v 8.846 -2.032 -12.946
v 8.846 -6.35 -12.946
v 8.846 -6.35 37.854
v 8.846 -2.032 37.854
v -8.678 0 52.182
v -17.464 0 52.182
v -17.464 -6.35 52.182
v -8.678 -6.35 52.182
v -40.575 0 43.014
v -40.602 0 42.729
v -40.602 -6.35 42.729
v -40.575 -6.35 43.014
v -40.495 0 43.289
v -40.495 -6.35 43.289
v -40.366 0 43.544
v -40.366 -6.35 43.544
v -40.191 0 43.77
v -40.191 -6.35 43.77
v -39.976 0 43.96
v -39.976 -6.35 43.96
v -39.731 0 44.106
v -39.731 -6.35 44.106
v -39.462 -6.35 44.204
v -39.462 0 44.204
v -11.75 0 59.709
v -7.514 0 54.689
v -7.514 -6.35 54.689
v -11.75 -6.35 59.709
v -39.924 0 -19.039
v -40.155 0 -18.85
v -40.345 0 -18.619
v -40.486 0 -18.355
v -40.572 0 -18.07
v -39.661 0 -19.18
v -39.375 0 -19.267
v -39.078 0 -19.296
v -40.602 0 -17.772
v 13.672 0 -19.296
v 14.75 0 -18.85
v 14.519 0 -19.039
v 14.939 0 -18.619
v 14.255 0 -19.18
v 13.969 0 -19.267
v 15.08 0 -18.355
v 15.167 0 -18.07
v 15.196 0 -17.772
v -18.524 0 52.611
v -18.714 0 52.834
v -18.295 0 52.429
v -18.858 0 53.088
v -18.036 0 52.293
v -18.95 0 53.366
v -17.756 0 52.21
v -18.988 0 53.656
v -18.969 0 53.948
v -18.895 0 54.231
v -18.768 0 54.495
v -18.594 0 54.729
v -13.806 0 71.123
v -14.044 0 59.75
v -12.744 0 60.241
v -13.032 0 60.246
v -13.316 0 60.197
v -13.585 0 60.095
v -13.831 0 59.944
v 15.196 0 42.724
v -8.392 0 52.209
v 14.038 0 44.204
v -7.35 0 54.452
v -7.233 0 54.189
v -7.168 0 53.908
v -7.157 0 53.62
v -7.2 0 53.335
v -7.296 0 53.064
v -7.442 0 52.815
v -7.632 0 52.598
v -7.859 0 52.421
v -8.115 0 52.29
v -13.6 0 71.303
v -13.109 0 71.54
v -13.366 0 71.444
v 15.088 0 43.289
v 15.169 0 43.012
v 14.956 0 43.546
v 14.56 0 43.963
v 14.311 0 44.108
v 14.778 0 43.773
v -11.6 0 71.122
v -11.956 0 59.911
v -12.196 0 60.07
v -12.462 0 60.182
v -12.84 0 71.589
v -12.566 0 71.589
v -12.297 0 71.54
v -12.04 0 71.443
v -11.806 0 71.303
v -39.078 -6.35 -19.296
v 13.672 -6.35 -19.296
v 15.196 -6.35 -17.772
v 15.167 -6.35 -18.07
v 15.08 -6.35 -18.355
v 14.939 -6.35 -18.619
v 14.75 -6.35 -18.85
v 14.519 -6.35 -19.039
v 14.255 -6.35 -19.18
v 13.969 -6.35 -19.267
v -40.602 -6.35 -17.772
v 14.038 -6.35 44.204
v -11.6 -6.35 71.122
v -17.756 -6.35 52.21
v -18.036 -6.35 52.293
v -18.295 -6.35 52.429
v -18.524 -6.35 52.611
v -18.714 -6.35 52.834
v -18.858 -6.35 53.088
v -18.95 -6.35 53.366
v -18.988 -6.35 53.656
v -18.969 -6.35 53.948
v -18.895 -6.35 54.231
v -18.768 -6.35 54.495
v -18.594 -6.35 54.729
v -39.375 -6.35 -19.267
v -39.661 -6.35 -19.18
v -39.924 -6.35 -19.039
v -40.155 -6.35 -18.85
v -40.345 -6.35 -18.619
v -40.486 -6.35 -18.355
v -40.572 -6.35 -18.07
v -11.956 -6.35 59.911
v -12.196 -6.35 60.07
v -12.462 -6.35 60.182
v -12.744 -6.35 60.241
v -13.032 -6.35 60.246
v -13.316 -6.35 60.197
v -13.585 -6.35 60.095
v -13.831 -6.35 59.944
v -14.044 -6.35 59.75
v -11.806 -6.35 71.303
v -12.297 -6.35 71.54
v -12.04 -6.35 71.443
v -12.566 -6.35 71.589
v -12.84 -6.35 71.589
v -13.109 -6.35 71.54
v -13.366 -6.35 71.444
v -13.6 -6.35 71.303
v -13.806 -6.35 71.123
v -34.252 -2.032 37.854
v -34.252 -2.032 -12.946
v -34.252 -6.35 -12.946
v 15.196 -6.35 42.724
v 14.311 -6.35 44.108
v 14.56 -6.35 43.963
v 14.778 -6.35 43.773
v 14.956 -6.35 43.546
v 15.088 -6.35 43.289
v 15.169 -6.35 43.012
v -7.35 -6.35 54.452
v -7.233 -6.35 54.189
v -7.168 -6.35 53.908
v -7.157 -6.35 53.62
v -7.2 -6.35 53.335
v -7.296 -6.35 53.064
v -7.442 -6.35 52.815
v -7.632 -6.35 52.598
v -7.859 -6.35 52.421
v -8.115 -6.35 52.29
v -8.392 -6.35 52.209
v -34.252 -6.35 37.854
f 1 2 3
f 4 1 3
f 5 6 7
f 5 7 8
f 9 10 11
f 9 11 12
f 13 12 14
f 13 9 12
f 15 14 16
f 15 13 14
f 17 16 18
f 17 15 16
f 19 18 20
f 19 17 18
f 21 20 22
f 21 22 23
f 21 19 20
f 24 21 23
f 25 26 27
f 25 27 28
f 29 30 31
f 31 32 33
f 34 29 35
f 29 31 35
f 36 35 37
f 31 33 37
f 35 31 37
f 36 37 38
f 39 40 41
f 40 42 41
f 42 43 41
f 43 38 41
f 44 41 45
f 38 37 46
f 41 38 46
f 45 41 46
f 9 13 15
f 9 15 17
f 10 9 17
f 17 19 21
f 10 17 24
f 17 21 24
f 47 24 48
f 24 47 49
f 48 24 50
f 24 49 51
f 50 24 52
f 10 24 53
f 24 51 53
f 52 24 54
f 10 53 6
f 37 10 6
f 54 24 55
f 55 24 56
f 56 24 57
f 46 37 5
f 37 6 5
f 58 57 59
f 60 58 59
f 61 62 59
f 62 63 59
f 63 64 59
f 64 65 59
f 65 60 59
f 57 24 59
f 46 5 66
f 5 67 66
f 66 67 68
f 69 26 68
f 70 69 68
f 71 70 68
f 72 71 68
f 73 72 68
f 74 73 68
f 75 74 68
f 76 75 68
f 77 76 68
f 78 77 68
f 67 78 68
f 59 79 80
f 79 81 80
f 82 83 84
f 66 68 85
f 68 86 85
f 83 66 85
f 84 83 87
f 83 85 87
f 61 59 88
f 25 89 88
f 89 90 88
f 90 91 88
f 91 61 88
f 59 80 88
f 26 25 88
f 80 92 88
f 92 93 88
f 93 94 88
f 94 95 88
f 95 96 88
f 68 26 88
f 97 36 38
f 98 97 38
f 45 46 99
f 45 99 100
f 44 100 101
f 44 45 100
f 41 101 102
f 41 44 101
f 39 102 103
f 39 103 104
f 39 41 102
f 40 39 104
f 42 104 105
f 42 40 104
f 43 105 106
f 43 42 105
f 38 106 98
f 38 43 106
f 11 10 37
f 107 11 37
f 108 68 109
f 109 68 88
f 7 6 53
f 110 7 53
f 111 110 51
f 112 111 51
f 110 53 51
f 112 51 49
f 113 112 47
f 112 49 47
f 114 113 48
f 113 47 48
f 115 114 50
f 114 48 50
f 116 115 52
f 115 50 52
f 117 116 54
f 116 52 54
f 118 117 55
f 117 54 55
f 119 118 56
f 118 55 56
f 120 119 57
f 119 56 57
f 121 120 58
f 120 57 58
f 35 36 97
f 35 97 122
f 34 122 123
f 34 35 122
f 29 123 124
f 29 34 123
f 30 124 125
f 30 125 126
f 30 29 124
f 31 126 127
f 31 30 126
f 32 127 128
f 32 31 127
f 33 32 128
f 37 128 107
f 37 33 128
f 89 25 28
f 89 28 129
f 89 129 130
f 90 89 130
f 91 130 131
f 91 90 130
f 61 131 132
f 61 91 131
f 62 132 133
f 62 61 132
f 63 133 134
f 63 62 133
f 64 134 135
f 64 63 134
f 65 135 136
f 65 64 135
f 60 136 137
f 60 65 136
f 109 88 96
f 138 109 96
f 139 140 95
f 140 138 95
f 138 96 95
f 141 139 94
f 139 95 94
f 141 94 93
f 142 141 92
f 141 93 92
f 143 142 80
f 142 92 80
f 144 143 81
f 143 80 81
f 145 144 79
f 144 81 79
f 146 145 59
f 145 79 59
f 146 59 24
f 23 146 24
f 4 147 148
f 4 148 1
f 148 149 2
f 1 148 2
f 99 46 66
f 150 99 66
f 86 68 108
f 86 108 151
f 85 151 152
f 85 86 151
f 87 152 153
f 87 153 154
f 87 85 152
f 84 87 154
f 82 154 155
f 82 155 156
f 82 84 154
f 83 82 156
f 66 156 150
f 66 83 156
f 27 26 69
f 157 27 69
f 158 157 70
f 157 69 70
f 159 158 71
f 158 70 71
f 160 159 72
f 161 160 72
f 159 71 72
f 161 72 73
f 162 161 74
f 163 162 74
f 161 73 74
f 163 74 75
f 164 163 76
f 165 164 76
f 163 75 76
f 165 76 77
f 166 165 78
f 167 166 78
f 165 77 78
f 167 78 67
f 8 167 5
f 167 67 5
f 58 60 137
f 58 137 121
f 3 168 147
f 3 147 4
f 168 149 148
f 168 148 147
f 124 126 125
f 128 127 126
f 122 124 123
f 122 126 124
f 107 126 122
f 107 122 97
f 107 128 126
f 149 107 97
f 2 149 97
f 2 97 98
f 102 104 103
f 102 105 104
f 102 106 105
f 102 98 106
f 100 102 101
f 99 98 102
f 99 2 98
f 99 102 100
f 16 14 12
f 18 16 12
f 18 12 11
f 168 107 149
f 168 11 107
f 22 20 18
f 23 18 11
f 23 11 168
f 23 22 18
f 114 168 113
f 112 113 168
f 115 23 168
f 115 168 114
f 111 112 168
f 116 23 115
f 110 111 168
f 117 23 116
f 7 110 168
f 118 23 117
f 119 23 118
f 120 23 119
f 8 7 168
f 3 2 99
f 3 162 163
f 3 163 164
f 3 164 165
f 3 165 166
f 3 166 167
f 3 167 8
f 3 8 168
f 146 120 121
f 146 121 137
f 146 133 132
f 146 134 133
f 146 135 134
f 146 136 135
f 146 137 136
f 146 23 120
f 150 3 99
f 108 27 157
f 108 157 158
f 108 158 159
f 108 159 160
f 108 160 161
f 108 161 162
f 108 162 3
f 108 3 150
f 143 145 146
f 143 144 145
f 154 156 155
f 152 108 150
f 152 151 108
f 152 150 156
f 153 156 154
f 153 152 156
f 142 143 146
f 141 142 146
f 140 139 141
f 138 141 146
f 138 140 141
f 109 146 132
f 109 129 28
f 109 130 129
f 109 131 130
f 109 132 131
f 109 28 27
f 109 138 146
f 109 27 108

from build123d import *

# Parameters (mm, degrees)
F1_DEPTH     = 6.35
F2_W         = 43.0978981023
F2_H         = 50.8
F3_DEPTH     = 4.318
F5_DEPTH     = 6.35
F7_DEPTH     = 6.351
F8_T1_DEPTH  = 6.35
F8_T3_DEPTH  = 6.35
F8_T5_DEPTH  = 6.35
F8_T7_DEPTH  = 13.7467402192
F8_T9_DEPTH  = 14.3479140779
F8_T11_DEPTH = 13.97
F8_T13_DEPTH = 13.97
F8_T15_DEPTH = 13.724225926


# Not quite as in the source:
# - a fillet or chamfer that OpenCascade refuses, or shapes differently, is made with other operations: its cross-section is extruded or revolved along the edge and cut away or added


with BuildPart() as f1:
    # F0 (on Front) → F1 (new body)
    with BuildSketch(Plane.XZ):
        Polygon((-40.601760045, 44.2037712147), (-40.601760045, 20.0136204353), (-40.601760045, -19.2962287853), (-31.9894673416, -19.2962287853), (6.5923849878, -19.2962287853), (15.1961380572, -19.2962287853), (15.1961380572, 20.0136204353), (15.1961380572, 44.2037712147), align=None)
    extrude(amount=F1_DEPTH)

    # F2 (on face) → F3 (cut, through all)
    with BuildSketch(Plane.XZ.offset(6.35)):
        with Locations((-12.7028109939, 12.4537712147)):
            Rectangle(F2_W, F2_H)
    extrude(amount=-F3_DEPTH, mode=Mode.SUBTRACT)

    # F4 (on Front) → F5 (join, through all)
    with BuildSketch(Plane.XZ):
        Polygon((-12.7028109939, 72.2804571797), (-39.4616971228, 44.2037712147), (14.0383420512, 44.2037712147), align=None)
    extrude(amount=F5_DEPTH)

    # F6 (on Front) → F7 (cut, through all)
    with BuildSketch(Plane.XZ):
        Polygon((-5.3985980339, 52.1819666028), (-12.8735816106, 61.0412061214), (-20.9022667259, 52.1819666028), align=None)
    extrude(amount=F7_DEPTH, mode=Mode.SUBTRACT)

    # F8: fillet of radius 1.524 on 8 edges, made by hand

    # F8_s2 → F8_t1 (join)
    with BuildSketch(Plane.XZ):
        with BuildLine():
            ThreePointArc((-11.7497792539, 59.7092922586), (-12.8875838111, 60.2502701687), (-14.0438236179, 59.7499044838))
            Line((-14.0438236179, 59.7499044838), (-12.8735816106, 61.0412061214))
            Line((-12.8735816106, 61.0412061214), (-11.7497792539, 59.7092922586))
        make_face()
    extrude(amount=F8_T1_DEPTH)

    # F8_s4 → F8_t3 (join)
    with BuildSketch(Plane.XZ):
        with BuildLine():
            ThreePointArc((-7.5136965339, 54.688749932), (-7.2963881401, 53.0637772981), (-8.6784767396, 52.1819666028))
            Line((-8.6784767396, 52.1819666028), (-5.3985980339, 52.1819666028))
            Line((-5.3985980339, 52.1819666028), (-7.5136965339, 54.688749932))
        make_face()
    extrude(amount=F8_T3_DEPTH)

    # F8_s6 → F8_t5 (join)
    with BuildSketch(Plane.XZ):
        with BuildLine():
            ThreePointArc((-17.4644255473, 52.1819666028), (-18.8576647272, 53.0883416458), (-18.5936897056, 54.7293621572))
            Line((-18.5936897056, 54.7293621572), (-20.9022667259, 52.1819666028))
            Line((-20.9022667259, 52.1819666028), (-17.4644255473, 52.1819666028))
        make_face()
    extrude(amount=F8_T5_DEPTH)

    # F8_s8 → F8_t7 (cut)
    with BuildSketch(Plane.XZ.offset(-3.6983701096)):
        with BuildLine():
            ThreePointArc((14.0383420512, 44.2037712147), (14.8722778172, 43.6636997843), (15.1961380572, 42.7244231708))
            Line((15.1961380572, 42.7244231708), (15.1961380572, 44.2037712147))
            Line((15.1961380572, 44.2037712147), (14.0383420512, 44.2037712147))
        make_face()
    extrude(amount=F8_T7_DEPTH, mode=Mode.SUBTRACT)

    # F8_s10 → F8_t9 (cut)
    with BuildSketch(Plane.XZ.offset(-3.9989570389)):
        with BuildLine():
            ThreePointArc((-11.5996190182, 71.1221685073), (-12.7029244443, 71.5951040748), (-13.8063863853, 71.122533806))
            Line((-13.8063863853, 71.122533806), (-12.7028109939, 72.2804571797))
            Line((-12.7028109939, 72.2804571797), (-11.5996190182, 71.1221685073))
        make_face()
    extrude(amount=F8_T9_DEPTH, mode=Mode.SUBTRACT)

    # F8_s12 → F8_t11 (cut)
    with BuildSketch(Plane.XZ.offset(-3.81)):
        with BuildLine():
            ThreePointArc((15.1961380572, -17.7722287853), (14.7497687918, -18.8498595199), (13.6721380572, -19.2962287853))
            Line((13.6721380572, -19.2962287853), (15.1961380572, -19.2962287853))
            Line((15.1961380572, -19.2962287853), (15.1961380572, -17.7722287853))
        make_face()
    extrude(amount=F8_T11_DEPTH, mode=Mode.SUBTRACT)

    # F8_s14 → F8_t13 (cut)
    with BuildSketch(Plane.XZ.offset(-3.81)):
        with BuildLine():
            ThreePointArc((-39.077760045, -19.2962287853), (-40.1553907795, -18.8498595199), (-40.601760045, -17.7722287853))
            Line((-40.601760045, -17.7722287853), (-40.601760045, -19.2962287853))
            Line((-40.601760045, -19.2962287853), (-39.077760045, -19.2962287853))
        make_face()
    extrude(amount=F8_T13_DEPTH, mode=Mode.SUBTRACT)

    # F8_s16 → F8_t15 (cut)
    with BuildSketch(Plane.XZ.offset(-3.687112963)):
        with BuildLine():
            ThreePointArc((-40.601760045, 42.7289260295), (-40.2835162614, 43.6609817932), (-39.4616971228, 44.2037712147))
            Line((-39.4616971228, 44.2037712147), (-40.601760045, 44.2037712147))
            Line((-40.601760045, 44.2037712147), (-40.601760045, 42.7289260295))
        make_face()
    extrude(amount=F8_T15_DEPTH, mode=Mode.SUBTRACT)


solid = f1.part
